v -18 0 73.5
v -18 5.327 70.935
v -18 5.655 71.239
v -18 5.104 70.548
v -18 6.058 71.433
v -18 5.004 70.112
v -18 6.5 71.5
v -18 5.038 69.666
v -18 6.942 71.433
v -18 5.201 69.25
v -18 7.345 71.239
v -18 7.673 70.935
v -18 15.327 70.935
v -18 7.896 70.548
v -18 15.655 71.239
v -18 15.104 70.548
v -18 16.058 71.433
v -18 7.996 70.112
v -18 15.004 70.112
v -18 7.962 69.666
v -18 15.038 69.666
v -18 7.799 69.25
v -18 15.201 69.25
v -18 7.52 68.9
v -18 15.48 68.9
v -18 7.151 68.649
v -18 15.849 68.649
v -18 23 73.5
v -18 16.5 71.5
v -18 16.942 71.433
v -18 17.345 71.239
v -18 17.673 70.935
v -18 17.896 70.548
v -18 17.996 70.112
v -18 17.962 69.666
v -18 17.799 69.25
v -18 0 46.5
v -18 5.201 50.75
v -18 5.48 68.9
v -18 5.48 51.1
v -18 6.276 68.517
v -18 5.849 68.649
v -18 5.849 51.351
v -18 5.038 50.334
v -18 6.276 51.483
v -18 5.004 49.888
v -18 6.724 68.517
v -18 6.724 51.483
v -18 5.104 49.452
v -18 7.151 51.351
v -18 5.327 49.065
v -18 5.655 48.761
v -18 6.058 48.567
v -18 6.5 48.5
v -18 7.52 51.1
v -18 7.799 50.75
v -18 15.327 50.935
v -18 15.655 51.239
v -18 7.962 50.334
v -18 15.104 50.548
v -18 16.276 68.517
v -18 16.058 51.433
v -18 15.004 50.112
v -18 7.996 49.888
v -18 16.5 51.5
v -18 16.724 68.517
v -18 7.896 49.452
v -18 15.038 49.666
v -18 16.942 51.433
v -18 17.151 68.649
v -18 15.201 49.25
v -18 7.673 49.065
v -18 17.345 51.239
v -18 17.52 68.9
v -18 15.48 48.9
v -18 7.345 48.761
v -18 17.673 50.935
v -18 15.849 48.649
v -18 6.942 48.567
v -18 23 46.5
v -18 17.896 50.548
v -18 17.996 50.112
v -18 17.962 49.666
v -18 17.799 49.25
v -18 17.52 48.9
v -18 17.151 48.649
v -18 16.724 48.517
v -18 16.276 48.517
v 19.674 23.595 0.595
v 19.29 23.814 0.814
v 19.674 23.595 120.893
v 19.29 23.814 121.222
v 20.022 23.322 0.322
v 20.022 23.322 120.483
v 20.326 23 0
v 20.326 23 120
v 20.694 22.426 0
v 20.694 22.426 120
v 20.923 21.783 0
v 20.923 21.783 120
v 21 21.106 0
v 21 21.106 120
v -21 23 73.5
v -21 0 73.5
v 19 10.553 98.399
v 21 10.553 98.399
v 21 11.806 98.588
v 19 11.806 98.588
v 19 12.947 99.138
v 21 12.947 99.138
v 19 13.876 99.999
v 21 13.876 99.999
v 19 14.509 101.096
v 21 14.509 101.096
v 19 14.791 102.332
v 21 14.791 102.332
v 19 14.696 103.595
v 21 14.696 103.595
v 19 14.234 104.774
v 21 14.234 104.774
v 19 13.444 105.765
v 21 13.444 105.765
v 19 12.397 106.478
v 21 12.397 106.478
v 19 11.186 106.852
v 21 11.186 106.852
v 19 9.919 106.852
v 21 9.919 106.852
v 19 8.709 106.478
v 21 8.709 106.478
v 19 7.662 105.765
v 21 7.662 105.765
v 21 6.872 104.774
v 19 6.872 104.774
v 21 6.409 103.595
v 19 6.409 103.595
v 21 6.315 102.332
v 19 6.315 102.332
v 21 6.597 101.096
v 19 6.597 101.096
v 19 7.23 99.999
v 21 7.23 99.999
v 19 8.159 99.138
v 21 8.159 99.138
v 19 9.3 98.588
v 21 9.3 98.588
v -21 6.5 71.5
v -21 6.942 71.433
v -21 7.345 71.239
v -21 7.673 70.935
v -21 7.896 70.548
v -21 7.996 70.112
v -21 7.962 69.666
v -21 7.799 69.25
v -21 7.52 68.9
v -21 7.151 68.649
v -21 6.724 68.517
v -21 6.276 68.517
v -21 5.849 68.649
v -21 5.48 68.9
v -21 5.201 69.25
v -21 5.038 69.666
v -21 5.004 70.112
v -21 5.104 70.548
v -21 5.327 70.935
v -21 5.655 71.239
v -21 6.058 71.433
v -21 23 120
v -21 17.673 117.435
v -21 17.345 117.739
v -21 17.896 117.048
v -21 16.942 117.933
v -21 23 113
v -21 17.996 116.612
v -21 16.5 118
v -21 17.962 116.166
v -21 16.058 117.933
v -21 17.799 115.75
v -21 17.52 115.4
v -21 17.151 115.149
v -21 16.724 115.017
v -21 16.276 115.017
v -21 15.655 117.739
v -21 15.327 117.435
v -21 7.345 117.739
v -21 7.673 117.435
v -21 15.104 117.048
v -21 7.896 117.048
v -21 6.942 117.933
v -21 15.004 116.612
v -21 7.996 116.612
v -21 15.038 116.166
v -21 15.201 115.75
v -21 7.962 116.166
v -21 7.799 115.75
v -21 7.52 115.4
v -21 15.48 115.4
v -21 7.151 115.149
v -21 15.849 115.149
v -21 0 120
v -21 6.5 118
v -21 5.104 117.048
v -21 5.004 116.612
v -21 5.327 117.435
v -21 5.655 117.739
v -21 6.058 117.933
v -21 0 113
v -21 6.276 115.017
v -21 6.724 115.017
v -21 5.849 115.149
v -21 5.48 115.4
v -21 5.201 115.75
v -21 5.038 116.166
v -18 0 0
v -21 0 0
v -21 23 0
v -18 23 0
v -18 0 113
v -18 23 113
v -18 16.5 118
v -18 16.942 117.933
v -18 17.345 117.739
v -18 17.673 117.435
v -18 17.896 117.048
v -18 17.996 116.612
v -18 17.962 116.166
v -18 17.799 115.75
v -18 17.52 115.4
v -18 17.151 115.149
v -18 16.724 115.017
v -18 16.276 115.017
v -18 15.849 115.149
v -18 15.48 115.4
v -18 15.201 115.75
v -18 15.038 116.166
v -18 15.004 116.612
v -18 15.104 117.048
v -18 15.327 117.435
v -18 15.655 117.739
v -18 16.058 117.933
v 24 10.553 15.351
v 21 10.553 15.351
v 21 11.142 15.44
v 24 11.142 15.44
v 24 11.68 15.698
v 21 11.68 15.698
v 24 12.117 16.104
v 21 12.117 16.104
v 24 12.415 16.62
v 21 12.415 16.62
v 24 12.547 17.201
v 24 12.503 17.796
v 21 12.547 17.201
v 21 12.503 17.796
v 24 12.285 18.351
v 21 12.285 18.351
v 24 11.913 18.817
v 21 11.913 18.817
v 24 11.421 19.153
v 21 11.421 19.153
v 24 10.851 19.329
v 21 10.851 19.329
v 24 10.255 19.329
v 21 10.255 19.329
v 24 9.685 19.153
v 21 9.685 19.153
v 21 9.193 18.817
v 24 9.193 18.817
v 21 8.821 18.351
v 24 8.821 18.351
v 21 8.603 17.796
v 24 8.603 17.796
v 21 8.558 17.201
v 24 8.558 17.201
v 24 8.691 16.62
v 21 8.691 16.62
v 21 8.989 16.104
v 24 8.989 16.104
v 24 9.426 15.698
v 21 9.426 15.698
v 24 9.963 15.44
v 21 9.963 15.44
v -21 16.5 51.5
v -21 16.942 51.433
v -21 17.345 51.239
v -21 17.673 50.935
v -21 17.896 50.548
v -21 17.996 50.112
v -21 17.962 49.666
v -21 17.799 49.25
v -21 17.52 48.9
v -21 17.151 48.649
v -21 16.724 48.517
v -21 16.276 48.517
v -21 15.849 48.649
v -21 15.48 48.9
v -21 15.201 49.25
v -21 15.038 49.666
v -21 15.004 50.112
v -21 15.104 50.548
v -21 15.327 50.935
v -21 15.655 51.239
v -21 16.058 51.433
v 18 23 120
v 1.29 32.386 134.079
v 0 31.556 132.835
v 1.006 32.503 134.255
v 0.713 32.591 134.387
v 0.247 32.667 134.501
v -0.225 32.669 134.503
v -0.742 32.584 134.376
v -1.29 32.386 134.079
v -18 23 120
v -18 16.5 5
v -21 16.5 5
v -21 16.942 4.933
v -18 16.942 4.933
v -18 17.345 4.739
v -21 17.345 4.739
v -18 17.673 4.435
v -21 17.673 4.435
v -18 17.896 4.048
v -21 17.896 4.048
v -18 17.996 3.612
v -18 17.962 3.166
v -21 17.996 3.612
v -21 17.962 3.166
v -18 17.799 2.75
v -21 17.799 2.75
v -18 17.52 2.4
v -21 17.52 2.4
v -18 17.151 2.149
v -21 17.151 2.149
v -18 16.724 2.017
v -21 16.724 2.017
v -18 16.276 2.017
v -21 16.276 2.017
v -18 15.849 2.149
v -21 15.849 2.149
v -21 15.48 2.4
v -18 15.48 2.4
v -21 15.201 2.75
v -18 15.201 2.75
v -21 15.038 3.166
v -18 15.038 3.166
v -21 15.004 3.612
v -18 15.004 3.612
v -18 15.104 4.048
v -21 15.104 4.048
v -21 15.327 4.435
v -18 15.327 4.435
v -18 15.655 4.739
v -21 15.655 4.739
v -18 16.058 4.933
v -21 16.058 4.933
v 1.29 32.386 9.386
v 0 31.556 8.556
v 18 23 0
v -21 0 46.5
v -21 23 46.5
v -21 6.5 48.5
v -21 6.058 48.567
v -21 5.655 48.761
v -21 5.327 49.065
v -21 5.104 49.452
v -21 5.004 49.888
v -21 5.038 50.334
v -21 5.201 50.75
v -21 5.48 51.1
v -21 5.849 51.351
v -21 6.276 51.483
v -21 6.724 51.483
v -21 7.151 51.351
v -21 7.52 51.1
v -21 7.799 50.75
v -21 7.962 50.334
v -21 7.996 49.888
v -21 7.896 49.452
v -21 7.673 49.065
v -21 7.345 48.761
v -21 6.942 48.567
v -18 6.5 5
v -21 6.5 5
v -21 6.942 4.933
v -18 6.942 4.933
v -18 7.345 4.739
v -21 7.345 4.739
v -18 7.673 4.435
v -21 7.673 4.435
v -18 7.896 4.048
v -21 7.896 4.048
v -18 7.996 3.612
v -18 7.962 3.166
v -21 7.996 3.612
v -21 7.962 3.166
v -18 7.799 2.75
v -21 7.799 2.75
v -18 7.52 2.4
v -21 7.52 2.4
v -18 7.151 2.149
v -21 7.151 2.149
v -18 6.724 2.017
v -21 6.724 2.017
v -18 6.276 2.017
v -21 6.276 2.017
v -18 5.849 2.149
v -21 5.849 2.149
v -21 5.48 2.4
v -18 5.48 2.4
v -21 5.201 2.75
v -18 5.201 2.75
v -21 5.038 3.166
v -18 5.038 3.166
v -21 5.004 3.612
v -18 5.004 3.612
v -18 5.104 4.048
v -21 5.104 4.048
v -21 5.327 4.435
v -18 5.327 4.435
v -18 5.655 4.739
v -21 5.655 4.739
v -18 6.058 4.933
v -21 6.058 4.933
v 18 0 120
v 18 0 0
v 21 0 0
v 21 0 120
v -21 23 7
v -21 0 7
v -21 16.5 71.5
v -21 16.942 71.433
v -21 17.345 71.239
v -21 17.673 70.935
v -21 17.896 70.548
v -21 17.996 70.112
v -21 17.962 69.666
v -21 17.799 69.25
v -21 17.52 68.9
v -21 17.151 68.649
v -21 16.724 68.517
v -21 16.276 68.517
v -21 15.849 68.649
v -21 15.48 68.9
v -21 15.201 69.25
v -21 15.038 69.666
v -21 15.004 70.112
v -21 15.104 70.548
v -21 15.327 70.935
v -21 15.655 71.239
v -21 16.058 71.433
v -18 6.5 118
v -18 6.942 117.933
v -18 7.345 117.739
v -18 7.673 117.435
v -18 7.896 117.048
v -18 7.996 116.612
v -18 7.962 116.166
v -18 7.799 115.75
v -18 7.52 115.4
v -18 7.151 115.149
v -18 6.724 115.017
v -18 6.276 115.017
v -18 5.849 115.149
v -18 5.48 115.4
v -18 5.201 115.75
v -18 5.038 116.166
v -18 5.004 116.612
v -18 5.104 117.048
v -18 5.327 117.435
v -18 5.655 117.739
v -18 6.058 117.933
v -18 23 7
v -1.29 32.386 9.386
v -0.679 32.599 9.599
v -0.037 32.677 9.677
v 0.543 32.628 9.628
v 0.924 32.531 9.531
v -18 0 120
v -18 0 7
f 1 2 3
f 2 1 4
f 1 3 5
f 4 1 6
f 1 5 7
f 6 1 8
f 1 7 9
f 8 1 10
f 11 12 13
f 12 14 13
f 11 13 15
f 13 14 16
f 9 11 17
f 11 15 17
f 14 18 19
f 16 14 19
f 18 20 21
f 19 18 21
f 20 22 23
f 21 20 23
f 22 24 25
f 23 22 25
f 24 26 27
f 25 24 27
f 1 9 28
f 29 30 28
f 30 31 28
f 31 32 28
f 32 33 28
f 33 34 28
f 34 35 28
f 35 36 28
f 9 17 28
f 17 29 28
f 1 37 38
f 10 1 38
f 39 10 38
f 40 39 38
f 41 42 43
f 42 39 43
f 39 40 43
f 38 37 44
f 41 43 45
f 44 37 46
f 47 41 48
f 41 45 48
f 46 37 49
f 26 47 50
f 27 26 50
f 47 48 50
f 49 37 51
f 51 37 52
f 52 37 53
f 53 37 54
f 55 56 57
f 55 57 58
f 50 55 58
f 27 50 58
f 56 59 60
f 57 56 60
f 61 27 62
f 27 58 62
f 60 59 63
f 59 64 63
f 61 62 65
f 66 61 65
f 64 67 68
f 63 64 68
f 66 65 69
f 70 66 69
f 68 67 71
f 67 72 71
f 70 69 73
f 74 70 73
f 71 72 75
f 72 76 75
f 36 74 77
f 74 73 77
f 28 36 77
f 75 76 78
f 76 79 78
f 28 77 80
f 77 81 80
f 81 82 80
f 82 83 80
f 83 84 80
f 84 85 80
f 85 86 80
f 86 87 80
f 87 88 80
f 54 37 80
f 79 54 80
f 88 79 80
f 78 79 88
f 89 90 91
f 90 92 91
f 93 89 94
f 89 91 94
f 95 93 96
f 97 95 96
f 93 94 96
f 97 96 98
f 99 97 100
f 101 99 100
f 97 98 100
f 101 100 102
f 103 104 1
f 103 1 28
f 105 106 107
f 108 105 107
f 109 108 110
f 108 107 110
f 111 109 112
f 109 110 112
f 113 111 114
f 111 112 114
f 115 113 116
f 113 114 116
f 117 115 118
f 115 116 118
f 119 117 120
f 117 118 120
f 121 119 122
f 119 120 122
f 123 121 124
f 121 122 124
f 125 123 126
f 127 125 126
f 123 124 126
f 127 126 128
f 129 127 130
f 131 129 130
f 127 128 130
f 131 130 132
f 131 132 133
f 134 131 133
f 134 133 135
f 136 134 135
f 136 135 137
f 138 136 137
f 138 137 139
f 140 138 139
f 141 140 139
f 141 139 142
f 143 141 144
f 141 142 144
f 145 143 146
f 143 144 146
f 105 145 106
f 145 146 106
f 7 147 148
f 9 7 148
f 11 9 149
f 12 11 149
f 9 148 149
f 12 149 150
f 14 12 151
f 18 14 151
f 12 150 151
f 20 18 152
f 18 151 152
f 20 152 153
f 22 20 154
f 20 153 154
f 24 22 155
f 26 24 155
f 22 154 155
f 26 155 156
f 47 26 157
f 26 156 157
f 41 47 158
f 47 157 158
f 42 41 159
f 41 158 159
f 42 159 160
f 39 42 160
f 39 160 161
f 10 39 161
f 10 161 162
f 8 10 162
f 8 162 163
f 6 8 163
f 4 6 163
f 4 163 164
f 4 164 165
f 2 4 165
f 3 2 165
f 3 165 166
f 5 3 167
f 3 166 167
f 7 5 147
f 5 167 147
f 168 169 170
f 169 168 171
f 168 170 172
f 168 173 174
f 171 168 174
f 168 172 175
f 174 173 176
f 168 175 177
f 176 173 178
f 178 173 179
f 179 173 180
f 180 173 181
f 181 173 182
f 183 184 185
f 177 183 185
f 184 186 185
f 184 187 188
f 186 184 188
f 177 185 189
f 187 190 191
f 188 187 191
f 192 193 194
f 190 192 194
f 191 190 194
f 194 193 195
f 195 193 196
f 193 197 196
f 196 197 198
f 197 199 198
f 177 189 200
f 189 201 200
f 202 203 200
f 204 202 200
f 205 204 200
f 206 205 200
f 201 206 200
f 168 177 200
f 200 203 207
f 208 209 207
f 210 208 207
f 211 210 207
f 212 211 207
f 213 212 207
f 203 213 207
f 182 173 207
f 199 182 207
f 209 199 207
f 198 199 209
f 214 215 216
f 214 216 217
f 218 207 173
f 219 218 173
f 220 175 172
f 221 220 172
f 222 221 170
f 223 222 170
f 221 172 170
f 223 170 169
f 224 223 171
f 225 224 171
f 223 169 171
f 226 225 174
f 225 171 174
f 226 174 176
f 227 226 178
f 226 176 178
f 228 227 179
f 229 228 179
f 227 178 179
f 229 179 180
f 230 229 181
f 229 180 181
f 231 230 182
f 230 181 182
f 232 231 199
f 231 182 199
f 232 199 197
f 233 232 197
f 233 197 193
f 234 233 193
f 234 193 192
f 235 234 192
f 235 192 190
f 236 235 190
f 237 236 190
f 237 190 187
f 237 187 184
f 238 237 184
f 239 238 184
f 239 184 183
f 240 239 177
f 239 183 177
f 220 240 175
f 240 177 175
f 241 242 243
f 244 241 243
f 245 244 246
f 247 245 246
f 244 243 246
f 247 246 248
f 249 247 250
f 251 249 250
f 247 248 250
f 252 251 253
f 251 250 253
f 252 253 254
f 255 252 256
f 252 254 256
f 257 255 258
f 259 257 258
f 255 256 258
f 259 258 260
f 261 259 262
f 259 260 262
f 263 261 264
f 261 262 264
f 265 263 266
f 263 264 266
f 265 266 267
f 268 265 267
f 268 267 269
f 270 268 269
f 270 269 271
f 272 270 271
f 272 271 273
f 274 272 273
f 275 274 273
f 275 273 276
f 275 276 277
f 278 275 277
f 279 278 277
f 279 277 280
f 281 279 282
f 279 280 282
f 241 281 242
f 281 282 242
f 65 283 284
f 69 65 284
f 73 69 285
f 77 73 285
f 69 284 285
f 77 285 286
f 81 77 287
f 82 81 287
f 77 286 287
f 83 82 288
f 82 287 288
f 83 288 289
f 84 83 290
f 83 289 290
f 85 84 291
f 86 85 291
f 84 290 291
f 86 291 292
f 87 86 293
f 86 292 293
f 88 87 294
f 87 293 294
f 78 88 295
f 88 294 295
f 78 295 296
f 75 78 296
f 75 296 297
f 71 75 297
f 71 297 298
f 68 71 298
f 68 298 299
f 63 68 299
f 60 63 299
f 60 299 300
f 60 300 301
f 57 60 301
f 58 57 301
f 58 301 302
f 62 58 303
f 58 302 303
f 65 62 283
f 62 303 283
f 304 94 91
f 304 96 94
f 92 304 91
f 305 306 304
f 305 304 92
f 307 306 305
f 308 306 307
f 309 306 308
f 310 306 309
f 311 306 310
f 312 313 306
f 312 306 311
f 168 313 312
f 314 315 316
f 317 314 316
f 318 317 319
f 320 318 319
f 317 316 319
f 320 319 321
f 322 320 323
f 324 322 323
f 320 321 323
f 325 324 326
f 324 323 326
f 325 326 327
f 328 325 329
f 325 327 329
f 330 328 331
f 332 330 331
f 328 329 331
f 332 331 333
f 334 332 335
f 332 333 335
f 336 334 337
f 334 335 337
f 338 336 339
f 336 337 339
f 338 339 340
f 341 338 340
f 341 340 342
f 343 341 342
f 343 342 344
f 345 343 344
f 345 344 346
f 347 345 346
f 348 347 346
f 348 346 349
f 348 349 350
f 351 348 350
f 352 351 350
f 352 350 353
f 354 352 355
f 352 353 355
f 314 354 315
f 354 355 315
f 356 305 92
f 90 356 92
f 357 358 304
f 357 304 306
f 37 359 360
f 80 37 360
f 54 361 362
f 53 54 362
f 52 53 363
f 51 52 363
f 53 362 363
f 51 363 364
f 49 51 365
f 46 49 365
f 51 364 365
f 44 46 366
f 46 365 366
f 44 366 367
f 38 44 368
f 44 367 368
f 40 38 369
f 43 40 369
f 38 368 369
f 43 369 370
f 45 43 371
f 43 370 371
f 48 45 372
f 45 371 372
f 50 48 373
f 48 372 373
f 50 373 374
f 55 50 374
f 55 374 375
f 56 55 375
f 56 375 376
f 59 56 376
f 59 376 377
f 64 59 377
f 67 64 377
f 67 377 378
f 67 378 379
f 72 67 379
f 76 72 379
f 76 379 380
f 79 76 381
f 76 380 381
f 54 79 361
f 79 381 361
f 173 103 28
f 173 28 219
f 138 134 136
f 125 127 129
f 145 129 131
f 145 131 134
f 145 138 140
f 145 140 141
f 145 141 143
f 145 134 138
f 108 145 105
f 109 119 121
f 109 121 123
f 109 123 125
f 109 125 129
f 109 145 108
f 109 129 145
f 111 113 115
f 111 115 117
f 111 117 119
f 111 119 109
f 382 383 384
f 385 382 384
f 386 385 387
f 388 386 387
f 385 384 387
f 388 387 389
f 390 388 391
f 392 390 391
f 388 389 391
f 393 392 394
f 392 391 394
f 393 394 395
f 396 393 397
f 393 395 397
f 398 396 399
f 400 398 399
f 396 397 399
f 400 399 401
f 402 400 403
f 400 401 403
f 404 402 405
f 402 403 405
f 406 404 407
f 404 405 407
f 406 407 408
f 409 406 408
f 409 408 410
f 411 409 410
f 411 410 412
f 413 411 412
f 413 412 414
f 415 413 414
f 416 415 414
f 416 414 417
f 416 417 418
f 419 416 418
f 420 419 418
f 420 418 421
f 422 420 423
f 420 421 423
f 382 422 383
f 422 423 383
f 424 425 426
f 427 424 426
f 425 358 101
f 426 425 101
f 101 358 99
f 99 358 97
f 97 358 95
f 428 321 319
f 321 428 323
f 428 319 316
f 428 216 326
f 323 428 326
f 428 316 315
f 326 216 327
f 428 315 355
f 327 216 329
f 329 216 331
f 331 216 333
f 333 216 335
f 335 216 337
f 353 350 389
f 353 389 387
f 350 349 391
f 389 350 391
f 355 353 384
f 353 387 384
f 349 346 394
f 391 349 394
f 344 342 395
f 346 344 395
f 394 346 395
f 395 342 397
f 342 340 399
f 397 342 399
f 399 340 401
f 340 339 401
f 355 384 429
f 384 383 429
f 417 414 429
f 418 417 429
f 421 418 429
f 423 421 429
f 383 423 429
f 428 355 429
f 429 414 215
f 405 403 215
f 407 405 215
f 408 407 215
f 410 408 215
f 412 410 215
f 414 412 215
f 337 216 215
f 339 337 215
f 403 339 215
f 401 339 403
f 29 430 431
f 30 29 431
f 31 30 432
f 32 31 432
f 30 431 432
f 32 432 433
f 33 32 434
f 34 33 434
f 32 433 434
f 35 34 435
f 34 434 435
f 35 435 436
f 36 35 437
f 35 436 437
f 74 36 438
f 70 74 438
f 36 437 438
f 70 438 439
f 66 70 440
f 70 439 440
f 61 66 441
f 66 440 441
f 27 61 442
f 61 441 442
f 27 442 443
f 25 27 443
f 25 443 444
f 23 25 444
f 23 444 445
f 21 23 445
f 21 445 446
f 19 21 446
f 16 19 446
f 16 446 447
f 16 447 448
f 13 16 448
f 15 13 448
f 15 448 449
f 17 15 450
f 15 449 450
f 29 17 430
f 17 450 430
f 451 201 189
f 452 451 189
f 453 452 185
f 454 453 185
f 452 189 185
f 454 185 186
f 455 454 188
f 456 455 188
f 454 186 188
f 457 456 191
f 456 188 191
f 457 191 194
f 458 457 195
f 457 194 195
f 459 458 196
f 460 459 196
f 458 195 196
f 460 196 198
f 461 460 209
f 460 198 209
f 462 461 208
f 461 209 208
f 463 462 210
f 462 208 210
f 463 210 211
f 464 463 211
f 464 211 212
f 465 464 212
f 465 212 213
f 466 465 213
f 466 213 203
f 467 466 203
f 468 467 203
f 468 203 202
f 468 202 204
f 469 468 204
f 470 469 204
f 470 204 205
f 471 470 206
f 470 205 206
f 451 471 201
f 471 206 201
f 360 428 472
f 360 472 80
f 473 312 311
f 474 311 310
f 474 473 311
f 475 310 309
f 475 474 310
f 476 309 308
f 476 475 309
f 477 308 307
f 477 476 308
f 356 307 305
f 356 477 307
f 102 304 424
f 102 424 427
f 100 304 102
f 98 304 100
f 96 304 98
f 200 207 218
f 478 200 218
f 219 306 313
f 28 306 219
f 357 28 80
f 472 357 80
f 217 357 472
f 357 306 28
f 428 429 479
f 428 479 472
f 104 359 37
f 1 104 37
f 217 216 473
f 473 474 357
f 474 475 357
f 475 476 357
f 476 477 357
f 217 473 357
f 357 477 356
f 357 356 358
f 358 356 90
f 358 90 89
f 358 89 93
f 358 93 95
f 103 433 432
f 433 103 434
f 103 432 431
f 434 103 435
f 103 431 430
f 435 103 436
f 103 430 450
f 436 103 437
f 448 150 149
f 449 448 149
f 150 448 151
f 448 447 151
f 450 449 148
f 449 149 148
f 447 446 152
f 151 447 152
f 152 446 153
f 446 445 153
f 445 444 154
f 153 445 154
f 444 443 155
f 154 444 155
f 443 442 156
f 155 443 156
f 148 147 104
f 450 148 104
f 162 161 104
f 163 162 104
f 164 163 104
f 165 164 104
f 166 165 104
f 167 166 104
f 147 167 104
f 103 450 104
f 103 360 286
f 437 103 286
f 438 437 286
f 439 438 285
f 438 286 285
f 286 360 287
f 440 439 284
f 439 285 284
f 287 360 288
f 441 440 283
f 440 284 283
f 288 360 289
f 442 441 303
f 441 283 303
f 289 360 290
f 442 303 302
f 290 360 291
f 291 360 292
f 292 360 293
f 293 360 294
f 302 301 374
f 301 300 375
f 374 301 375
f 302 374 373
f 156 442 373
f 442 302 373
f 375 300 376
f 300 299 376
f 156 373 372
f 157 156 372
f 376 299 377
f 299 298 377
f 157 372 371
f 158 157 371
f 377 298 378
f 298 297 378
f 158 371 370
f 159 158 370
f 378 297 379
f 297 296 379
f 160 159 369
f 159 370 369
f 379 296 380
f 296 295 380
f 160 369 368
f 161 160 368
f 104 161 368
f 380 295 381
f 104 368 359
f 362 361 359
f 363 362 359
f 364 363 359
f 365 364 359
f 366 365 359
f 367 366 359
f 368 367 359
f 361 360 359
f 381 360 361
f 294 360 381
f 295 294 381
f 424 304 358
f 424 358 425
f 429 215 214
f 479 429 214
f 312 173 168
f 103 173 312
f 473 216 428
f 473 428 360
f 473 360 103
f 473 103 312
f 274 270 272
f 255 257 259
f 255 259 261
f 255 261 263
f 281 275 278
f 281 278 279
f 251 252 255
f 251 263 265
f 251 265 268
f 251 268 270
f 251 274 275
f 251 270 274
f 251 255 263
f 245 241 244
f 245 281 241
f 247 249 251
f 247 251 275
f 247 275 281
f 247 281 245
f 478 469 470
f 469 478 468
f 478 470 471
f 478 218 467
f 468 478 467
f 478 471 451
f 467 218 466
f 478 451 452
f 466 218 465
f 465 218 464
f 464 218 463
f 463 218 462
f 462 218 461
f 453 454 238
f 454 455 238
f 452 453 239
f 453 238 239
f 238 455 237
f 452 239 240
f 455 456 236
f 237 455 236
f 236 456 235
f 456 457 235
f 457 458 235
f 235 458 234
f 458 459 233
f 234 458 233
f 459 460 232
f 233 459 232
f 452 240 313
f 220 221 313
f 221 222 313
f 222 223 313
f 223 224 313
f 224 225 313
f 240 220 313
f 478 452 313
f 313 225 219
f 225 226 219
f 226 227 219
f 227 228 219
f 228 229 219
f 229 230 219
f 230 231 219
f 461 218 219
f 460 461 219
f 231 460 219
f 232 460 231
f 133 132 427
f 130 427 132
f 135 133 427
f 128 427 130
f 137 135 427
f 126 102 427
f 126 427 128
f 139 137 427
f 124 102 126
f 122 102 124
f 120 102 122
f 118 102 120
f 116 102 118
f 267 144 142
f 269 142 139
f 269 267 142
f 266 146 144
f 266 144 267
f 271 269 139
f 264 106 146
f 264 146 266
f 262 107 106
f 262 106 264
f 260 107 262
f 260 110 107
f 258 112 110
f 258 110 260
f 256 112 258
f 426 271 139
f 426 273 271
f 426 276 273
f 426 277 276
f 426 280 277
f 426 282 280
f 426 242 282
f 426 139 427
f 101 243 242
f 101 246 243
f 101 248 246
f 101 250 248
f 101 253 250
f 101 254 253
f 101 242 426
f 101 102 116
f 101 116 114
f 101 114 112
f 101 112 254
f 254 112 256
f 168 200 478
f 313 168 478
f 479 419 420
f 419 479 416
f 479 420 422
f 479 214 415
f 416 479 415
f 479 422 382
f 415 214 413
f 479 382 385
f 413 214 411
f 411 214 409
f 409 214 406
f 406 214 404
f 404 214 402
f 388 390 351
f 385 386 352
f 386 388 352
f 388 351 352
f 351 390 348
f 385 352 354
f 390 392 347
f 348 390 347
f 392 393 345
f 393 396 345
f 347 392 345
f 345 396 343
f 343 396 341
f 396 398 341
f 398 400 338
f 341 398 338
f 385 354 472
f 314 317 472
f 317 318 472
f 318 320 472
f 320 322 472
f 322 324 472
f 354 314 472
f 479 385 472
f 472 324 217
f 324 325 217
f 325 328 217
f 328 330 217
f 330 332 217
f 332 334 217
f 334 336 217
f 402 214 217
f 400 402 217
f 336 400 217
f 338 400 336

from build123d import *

# Parameters (mm, degrees)
BOSS_EXTRUDE1_DEPTH = 120
BOSS_EXTRUDE2_DEPTH = 15
CUT_EXTRUDE1_DEPTH  = 43
CUT_EXTRUDE2_DEPTH  = 43
FILLET1_R           = 3
FILLET2_R           = 3
SKETCH6_W           = 39.5
SKETCH6_H           = 23
SKETCH6_R           = 1.5
CUT_EXTRUDE3_DEPTH  = 3
SKETCH7_R           = 4.25
CUT_EXTRUDE4_DEPTH  = 2
SKETCH8_R           = 4.25
CUT_EXTRUDE5_DEPTH  = 2
BOSS_EXTRUDE3_START = 2
SKETCH9_R           = 4.25
BOSS_EXTRUDE3_DEPTH = 2
SKETCH10_R          = 2
BOSS_EXTRUDE4_DEPTH = 3


with BuildPart() as part:
    # Sketch2 → Boss-Extrude1 (new body)
    with BuildSketch(Plane.XY):
        Polygon((-18, 23), (0, 31.556461876), (18, 23), (18, 20), (18, 0), (21, 0), (21, 23), (0, 33), (-21, 23), (-21, 0), (-18, 0), (-18, 20), align=None)
    extrude(amount=BOSS_EXTRUDE1_DEPTH)

    # Sketch3 → Boss-Extrude2 (add)
    with BuildSketch(Plane.XY.offset(120)):
        Polygon((-18, 23), (-21, 23), (0, 33), (21, 23), (18, 23), (0, 31.556461876), align=None)
    extrude(amount=BOSS_EXTRUDE2_DEPTH)

    # Sketch4 → Cut-Extrude1 (cut)
    with BuildSketch(Plane.ZY.offset(21)):
        Polygon((135, 23), (120, 23), (135, 33), align=None)
    extrude(amount=-CUT_EXTRUDE1_DEPTH, mode=Mode.SUBTRACT)

    # Sketch5 → Cut-Extrude2 (cut)
    with BuildSketch(Plane(origin=(21, 0, 0), x_dir=(0, 0, -1), z_dir=(1, 0, 0))):
        Polygon((0, 23), (0, 33), (-10, 33), align=None)
    extrude(amount=-CUT_EXTRUDE2_DEPTH, mode=Mode.SUBTRACT)

    # Fillet1
    fillet1_edges = [part.edges().sort_by_distance(p)[0] for p in [
        (0, 33, 72.5),
    ]]
    fillet(fillet1_edges, radius=FILLET1_R)

    # Fillet2
    fillet2_edges = [part.edges().sort_by_distance(p)[0] for p in [
        (21, 23, 60),
    ]]
    fillet(fillet2_edges, radius=FILLET2_R)

    # Sketch6 → Cut-Extrude3 (cut)
    with BuildSketch(Plane.ZY.offset(21)):
        with Locations((26.75, 11.5)):
            Rectangle(SKETCH6_W, SKETCH6_H)
        with Locations((93.25, 11.5)):
            Rectangle(SKETCH6_W, SKETCH6_H)
        with Locations((116.5, 6.5)):
            Circle(SKETCH6_R)
        with Locations((116.5, 16.5)):
            Circle(SKETCH6_R)
        with Locations((70, 6.5)):
            Circle(SKETCH6_R)
        with Locations((50, 16.5)):
            Circle(SKETCH6_R)
        with Locations((3.5, 16.5)):
            Circle(SKETCH6_R)
        with Locations((3.5, 6.5)):
            Circle(SKETCH6_R)
        with Locations(Location((50, 6.5, 0), (0, 0, 180))):
            Circle(SKETCH6_R)
        with Locations((70, 16.5)):
            Circle(SKETCH6_R)
    extrude(amount=-CUT_EXTRUDE3_DEPTH, mode=Mode.SUBTRACT)

    # Sketch7 → Cut-Extrude4 (cut)
    with BuildSketch(Plane(origin=(21, 0, 0), x_dir=(0, 0, -1), z_dir=(1, 0, 0))):
        with Locations((-102.649161404, 10.552899521)):
            Circle(SKETCH7_R)
    extrude(amount=-CUT_EXTRUDE4_DEPTH, mode=Mode.SUBTRACT)

    # Sketch8 → Cut-Extrude5 (cut)
    with BuildSketch(Plane(origin=(21, 0, 0), x_dir=(0, 0, -1), z_dir=(1, 0, 0))):
        with Locations((-17.350838596, 10.552899521)):
            Circle(SKETCH8_R)
    extrude(amount=-CUT_EXTRUDE5_DEPTH, mode=Mode.SUBTRACT)

    # Sketch9 → Boss-Extrude3 (add)
    with BuildSketch(Plane(origin=(19, 0, 0), x_dir=(0, 0, -1), z_dir=(1, 0, 0)).offset(BOSS_EXTRUDE3_START)):
        with Locations((-17.350838596, 10.552899521)):
            Circle(SKETCH9_R)
    extrude(amount=-BOSS_EXTRUDE3_DEPTH)

    # Sketch10 → Boss-Extrude4 (add)
    with BuildSketch(Plane(origin=(21, 0, 0), x_dir=(0, 0, -1), z_dir=(1, 0, 0))):
        with Locations((-17.350838596, 10.552899521)):
            Circle(SKETCH10_R)
    extrude(amount=BOSS_EXTRUDE4_DEPTH)


solid = part.part
